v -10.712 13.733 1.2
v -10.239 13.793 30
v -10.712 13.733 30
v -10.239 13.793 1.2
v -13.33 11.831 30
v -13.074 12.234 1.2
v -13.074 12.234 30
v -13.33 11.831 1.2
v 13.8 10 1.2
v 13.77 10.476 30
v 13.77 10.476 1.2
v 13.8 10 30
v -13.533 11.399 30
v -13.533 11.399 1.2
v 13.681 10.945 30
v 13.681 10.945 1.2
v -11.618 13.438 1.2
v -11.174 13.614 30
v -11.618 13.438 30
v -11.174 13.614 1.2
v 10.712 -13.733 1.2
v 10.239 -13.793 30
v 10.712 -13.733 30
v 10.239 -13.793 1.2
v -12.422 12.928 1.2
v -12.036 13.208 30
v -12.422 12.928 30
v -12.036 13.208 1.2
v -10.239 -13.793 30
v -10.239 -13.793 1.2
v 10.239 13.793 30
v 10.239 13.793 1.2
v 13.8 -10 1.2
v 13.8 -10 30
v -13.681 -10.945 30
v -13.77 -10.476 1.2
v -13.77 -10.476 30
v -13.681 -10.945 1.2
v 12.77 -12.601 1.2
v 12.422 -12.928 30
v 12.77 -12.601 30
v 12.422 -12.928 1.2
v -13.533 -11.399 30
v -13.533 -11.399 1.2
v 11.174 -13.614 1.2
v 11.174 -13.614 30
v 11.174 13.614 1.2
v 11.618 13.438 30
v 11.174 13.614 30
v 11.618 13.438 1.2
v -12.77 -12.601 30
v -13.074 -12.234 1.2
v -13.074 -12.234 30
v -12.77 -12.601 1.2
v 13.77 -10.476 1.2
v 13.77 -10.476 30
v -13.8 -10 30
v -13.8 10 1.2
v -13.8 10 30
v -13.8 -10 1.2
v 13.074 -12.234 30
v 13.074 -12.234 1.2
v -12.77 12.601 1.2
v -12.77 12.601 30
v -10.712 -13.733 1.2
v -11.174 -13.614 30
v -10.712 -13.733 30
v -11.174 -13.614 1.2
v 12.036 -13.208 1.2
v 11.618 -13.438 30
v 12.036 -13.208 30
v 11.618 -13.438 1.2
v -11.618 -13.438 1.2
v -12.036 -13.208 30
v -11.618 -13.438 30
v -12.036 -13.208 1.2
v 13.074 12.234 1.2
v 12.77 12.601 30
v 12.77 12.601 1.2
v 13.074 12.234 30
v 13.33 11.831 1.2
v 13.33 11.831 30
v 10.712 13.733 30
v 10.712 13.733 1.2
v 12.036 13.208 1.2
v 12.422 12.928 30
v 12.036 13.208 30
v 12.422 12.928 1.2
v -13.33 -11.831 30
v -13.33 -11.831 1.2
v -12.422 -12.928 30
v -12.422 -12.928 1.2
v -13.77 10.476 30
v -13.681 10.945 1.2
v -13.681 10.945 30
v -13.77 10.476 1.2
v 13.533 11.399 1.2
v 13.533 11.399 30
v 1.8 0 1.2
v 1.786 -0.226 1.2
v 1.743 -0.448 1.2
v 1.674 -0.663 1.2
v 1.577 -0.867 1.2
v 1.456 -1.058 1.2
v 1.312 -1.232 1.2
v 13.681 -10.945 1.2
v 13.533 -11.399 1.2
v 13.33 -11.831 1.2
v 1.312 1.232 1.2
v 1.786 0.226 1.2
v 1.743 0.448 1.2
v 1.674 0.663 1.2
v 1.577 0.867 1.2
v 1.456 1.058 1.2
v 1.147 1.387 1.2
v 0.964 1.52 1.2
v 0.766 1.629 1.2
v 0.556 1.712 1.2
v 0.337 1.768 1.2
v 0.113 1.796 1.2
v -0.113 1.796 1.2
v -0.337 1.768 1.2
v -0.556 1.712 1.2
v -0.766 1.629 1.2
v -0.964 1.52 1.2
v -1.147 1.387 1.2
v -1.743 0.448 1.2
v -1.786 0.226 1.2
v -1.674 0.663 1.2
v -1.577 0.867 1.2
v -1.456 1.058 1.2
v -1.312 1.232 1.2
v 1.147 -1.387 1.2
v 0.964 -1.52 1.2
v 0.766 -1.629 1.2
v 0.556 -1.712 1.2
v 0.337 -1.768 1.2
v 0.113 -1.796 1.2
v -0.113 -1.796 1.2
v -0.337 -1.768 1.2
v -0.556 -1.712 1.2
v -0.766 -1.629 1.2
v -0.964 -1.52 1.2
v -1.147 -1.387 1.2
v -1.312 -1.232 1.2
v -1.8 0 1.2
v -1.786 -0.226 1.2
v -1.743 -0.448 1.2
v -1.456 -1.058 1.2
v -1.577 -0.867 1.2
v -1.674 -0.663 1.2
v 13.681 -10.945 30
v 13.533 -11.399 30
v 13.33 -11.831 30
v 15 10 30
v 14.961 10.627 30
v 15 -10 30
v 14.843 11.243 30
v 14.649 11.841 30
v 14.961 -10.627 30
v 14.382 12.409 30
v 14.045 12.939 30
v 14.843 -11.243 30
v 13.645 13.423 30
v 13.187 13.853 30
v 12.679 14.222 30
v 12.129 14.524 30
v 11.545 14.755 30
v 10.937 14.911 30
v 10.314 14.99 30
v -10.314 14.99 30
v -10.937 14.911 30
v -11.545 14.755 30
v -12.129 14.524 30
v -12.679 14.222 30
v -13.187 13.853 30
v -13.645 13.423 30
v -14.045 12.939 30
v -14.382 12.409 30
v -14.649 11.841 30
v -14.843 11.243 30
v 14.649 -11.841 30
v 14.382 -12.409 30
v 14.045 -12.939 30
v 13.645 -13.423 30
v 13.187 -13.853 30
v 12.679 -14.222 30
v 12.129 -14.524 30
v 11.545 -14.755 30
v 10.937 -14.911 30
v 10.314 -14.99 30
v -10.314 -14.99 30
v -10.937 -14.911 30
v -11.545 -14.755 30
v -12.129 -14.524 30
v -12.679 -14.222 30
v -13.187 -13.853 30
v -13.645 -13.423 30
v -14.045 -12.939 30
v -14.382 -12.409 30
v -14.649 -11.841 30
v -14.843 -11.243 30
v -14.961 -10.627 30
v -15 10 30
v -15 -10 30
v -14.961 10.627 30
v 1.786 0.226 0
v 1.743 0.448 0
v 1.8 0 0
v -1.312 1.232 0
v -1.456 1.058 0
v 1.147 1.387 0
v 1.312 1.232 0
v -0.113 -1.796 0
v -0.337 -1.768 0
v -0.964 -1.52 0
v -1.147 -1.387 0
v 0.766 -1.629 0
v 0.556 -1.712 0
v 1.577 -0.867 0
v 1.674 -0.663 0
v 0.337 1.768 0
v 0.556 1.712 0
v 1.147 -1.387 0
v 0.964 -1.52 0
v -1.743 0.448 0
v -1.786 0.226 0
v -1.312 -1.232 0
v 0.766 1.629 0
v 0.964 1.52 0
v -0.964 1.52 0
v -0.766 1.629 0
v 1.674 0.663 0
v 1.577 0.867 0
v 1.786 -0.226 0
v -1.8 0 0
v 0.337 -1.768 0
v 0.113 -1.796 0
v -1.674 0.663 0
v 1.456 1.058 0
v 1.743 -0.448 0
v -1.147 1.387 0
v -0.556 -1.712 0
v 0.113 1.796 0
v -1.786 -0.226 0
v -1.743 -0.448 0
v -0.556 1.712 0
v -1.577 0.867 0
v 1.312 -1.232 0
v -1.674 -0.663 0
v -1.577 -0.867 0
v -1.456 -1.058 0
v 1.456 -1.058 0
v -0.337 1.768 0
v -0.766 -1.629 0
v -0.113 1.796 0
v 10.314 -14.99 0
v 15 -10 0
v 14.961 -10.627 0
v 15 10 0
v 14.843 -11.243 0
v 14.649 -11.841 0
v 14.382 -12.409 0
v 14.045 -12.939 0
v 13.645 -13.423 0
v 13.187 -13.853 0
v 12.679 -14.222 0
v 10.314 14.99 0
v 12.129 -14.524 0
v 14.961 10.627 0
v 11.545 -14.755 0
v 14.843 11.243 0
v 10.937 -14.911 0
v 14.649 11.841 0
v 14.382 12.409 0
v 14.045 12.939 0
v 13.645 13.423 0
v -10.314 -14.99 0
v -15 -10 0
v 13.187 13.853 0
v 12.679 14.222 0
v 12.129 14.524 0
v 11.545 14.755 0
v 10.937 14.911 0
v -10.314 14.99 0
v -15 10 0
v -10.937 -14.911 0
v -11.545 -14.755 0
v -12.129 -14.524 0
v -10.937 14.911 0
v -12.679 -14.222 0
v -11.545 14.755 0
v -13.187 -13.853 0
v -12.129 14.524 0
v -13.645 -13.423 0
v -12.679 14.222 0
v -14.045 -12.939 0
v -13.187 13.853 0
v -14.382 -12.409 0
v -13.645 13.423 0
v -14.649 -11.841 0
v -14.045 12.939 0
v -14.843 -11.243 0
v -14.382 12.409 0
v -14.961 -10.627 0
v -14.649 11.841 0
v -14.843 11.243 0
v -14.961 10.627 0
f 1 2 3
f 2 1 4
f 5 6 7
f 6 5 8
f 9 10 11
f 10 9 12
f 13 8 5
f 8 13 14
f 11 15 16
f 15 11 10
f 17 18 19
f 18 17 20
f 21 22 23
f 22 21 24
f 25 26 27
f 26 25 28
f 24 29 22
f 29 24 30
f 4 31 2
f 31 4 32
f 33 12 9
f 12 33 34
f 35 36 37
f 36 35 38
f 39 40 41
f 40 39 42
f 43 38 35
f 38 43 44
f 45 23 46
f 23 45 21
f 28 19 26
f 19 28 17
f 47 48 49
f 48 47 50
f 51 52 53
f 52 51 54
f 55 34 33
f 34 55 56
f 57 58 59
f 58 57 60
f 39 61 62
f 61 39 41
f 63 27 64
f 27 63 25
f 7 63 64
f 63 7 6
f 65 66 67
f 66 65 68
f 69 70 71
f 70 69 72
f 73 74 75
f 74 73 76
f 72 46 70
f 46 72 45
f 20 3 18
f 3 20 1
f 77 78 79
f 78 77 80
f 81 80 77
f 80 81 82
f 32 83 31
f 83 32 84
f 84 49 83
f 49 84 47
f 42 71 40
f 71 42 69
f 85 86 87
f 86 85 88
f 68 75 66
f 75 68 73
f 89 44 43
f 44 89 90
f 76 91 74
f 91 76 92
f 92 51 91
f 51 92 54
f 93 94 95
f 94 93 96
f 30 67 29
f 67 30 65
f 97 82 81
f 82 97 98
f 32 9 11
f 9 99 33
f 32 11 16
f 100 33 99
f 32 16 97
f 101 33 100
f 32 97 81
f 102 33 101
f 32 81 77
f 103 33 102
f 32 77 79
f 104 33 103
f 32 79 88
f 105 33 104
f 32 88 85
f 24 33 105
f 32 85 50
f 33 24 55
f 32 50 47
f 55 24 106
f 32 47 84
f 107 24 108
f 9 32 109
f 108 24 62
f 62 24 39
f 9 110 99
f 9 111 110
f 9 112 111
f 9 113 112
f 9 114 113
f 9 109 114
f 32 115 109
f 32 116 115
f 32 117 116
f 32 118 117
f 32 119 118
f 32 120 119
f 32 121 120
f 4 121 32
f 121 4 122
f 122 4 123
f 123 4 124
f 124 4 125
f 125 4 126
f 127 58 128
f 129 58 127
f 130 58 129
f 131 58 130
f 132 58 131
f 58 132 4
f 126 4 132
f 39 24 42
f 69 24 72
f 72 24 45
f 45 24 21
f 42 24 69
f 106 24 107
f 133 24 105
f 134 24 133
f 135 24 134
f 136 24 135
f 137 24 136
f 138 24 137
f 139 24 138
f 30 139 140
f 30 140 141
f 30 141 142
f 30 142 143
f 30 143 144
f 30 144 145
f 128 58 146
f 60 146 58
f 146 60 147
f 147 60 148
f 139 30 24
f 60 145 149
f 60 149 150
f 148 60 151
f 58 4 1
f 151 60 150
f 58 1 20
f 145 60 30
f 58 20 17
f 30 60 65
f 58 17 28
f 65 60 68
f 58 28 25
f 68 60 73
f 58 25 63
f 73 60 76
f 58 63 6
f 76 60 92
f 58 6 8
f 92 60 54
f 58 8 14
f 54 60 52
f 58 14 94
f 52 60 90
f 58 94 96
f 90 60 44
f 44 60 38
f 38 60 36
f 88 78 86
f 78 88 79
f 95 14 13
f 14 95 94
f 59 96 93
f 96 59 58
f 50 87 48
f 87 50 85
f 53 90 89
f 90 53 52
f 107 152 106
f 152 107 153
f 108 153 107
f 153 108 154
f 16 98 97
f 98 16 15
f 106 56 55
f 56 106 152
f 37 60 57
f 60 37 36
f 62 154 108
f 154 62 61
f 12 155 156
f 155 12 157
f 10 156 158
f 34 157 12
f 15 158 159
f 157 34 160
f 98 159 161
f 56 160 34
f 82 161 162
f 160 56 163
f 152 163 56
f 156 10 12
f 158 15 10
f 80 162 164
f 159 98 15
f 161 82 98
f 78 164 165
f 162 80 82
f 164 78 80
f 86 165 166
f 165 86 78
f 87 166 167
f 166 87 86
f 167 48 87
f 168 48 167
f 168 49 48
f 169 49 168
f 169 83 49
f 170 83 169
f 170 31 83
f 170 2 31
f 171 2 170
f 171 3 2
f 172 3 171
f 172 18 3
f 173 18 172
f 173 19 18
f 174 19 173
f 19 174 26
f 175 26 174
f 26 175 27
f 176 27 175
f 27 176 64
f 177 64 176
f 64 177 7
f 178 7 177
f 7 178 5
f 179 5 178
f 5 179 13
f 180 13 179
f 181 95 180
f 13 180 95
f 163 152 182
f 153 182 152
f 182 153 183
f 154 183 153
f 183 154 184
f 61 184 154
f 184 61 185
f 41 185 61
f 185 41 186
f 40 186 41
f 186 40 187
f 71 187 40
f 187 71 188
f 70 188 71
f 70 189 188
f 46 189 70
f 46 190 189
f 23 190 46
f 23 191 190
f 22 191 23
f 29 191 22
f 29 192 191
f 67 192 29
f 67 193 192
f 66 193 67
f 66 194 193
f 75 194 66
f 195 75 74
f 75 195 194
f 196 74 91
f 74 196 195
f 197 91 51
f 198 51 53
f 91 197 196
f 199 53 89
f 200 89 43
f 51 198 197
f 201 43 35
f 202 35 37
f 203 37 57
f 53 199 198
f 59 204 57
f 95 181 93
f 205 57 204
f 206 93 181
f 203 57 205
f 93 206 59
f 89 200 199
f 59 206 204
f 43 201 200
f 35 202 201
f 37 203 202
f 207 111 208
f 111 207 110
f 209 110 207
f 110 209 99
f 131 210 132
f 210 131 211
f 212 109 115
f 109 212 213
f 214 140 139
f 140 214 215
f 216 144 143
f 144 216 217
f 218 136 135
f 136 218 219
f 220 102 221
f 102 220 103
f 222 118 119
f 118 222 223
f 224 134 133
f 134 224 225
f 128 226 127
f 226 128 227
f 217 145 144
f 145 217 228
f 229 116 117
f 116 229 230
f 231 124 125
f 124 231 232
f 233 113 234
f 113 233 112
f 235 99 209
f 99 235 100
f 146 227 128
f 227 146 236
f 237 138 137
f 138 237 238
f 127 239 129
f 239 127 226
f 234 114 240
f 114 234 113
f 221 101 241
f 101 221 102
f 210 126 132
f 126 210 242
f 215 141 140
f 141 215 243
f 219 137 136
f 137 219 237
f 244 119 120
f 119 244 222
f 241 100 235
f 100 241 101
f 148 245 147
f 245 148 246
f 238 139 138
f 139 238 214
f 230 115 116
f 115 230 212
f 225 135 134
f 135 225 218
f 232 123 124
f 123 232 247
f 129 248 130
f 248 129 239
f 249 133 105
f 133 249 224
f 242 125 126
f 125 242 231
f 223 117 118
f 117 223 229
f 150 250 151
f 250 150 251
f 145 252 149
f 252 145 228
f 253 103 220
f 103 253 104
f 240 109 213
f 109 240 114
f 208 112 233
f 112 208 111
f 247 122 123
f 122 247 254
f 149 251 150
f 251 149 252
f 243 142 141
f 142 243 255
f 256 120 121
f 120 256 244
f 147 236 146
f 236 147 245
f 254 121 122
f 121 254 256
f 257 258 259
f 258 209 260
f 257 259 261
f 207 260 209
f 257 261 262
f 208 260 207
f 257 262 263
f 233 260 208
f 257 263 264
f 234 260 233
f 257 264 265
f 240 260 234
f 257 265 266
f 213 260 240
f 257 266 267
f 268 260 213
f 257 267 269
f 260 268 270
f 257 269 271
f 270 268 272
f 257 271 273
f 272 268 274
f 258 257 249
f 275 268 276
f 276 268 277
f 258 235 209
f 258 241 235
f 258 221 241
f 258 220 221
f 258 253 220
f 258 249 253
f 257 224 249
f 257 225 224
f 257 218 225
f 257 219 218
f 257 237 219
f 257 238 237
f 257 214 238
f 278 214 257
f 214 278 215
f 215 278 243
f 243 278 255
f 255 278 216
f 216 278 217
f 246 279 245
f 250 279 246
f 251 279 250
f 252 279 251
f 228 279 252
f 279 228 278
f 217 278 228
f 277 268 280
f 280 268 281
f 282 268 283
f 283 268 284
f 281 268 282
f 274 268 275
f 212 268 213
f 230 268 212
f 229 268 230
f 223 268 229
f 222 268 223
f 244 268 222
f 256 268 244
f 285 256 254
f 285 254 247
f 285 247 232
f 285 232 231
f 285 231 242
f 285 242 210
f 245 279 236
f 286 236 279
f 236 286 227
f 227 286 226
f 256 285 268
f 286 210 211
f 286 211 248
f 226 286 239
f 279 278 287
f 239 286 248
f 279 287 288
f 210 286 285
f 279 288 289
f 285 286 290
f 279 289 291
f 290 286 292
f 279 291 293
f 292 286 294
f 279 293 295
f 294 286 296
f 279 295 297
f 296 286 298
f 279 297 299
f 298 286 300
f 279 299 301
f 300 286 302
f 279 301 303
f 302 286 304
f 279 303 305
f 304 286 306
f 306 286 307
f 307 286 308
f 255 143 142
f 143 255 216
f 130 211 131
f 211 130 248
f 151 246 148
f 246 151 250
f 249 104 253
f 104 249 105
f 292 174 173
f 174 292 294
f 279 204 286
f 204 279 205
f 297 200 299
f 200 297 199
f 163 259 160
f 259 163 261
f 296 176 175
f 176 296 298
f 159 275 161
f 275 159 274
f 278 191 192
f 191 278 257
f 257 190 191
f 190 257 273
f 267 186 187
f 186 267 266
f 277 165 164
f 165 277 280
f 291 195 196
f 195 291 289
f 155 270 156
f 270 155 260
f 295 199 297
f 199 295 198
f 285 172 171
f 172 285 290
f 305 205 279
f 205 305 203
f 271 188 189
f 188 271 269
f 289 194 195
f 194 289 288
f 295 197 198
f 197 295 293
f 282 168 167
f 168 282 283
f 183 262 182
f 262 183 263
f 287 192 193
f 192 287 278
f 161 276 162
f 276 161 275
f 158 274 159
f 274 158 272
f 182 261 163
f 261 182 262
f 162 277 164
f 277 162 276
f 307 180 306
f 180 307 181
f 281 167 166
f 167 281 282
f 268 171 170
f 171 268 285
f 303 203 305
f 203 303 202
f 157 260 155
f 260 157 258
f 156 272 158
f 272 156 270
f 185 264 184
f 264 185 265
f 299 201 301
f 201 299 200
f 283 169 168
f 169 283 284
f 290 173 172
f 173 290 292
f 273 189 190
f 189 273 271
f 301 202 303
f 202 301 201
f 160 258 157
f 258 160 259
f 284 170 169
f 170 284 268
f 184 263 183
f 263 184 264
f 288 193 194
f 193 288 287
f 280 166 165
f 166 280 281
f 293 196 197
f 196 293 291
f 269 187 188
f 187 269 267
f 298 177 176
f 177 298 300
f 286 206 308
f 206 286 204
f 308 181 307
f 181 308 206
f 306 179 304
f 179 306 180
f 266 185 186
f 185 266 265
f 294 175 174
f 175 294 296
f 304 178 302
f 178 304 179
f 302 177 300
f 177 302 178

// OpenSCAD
$fn = 50;


difference() {
	union() {
		hull() {
			translate(v = [-10.0000000000, 10.0000000000, 0]) {
				cylinder(h = 30, r = 5);
			}
			translate(v = [10.0000000000, 10.0000000000, 0]) {
				cylinder(h = 30, r = 5);
			}
			translate(v = [-10.0000000000, -10.0000000000, 0]) {
				cylinder(h = 30, r = 5);
			}
			translate(v = [10.0000000000, -10.0000000000, 0]) {
				cylinder(h = 30, r = 5);
			}
		}
	}
	union() {
		translate(v = [0, 0, 1.2000000000]) {
			hull() {
				translate(v = [-10.0000000000, 10.0000000000, 0]) {
					cylinder(h = 28.8000000000, r = 3.8000000000);
				}
				translate(v = [10.0000000000, 10.0000000000, 0]) {
					cylinder(h = 28.8000000000, r = 3.8000000000);
				}
				translate(v = [-10.0000000000, -10.0000000000, 0]) {
					cylinder(h = 28.8000000000, r = 3.8000000000);
				}
				translate(v = [10.0000000000, -10.0000000000, 0]) {
					cylinder(h = 28.8000000000, r = 3.8000000000);
				}
			}
		}
		#cylinder(h = 1.2000000000, r = 1.8000000000);
	}
}
